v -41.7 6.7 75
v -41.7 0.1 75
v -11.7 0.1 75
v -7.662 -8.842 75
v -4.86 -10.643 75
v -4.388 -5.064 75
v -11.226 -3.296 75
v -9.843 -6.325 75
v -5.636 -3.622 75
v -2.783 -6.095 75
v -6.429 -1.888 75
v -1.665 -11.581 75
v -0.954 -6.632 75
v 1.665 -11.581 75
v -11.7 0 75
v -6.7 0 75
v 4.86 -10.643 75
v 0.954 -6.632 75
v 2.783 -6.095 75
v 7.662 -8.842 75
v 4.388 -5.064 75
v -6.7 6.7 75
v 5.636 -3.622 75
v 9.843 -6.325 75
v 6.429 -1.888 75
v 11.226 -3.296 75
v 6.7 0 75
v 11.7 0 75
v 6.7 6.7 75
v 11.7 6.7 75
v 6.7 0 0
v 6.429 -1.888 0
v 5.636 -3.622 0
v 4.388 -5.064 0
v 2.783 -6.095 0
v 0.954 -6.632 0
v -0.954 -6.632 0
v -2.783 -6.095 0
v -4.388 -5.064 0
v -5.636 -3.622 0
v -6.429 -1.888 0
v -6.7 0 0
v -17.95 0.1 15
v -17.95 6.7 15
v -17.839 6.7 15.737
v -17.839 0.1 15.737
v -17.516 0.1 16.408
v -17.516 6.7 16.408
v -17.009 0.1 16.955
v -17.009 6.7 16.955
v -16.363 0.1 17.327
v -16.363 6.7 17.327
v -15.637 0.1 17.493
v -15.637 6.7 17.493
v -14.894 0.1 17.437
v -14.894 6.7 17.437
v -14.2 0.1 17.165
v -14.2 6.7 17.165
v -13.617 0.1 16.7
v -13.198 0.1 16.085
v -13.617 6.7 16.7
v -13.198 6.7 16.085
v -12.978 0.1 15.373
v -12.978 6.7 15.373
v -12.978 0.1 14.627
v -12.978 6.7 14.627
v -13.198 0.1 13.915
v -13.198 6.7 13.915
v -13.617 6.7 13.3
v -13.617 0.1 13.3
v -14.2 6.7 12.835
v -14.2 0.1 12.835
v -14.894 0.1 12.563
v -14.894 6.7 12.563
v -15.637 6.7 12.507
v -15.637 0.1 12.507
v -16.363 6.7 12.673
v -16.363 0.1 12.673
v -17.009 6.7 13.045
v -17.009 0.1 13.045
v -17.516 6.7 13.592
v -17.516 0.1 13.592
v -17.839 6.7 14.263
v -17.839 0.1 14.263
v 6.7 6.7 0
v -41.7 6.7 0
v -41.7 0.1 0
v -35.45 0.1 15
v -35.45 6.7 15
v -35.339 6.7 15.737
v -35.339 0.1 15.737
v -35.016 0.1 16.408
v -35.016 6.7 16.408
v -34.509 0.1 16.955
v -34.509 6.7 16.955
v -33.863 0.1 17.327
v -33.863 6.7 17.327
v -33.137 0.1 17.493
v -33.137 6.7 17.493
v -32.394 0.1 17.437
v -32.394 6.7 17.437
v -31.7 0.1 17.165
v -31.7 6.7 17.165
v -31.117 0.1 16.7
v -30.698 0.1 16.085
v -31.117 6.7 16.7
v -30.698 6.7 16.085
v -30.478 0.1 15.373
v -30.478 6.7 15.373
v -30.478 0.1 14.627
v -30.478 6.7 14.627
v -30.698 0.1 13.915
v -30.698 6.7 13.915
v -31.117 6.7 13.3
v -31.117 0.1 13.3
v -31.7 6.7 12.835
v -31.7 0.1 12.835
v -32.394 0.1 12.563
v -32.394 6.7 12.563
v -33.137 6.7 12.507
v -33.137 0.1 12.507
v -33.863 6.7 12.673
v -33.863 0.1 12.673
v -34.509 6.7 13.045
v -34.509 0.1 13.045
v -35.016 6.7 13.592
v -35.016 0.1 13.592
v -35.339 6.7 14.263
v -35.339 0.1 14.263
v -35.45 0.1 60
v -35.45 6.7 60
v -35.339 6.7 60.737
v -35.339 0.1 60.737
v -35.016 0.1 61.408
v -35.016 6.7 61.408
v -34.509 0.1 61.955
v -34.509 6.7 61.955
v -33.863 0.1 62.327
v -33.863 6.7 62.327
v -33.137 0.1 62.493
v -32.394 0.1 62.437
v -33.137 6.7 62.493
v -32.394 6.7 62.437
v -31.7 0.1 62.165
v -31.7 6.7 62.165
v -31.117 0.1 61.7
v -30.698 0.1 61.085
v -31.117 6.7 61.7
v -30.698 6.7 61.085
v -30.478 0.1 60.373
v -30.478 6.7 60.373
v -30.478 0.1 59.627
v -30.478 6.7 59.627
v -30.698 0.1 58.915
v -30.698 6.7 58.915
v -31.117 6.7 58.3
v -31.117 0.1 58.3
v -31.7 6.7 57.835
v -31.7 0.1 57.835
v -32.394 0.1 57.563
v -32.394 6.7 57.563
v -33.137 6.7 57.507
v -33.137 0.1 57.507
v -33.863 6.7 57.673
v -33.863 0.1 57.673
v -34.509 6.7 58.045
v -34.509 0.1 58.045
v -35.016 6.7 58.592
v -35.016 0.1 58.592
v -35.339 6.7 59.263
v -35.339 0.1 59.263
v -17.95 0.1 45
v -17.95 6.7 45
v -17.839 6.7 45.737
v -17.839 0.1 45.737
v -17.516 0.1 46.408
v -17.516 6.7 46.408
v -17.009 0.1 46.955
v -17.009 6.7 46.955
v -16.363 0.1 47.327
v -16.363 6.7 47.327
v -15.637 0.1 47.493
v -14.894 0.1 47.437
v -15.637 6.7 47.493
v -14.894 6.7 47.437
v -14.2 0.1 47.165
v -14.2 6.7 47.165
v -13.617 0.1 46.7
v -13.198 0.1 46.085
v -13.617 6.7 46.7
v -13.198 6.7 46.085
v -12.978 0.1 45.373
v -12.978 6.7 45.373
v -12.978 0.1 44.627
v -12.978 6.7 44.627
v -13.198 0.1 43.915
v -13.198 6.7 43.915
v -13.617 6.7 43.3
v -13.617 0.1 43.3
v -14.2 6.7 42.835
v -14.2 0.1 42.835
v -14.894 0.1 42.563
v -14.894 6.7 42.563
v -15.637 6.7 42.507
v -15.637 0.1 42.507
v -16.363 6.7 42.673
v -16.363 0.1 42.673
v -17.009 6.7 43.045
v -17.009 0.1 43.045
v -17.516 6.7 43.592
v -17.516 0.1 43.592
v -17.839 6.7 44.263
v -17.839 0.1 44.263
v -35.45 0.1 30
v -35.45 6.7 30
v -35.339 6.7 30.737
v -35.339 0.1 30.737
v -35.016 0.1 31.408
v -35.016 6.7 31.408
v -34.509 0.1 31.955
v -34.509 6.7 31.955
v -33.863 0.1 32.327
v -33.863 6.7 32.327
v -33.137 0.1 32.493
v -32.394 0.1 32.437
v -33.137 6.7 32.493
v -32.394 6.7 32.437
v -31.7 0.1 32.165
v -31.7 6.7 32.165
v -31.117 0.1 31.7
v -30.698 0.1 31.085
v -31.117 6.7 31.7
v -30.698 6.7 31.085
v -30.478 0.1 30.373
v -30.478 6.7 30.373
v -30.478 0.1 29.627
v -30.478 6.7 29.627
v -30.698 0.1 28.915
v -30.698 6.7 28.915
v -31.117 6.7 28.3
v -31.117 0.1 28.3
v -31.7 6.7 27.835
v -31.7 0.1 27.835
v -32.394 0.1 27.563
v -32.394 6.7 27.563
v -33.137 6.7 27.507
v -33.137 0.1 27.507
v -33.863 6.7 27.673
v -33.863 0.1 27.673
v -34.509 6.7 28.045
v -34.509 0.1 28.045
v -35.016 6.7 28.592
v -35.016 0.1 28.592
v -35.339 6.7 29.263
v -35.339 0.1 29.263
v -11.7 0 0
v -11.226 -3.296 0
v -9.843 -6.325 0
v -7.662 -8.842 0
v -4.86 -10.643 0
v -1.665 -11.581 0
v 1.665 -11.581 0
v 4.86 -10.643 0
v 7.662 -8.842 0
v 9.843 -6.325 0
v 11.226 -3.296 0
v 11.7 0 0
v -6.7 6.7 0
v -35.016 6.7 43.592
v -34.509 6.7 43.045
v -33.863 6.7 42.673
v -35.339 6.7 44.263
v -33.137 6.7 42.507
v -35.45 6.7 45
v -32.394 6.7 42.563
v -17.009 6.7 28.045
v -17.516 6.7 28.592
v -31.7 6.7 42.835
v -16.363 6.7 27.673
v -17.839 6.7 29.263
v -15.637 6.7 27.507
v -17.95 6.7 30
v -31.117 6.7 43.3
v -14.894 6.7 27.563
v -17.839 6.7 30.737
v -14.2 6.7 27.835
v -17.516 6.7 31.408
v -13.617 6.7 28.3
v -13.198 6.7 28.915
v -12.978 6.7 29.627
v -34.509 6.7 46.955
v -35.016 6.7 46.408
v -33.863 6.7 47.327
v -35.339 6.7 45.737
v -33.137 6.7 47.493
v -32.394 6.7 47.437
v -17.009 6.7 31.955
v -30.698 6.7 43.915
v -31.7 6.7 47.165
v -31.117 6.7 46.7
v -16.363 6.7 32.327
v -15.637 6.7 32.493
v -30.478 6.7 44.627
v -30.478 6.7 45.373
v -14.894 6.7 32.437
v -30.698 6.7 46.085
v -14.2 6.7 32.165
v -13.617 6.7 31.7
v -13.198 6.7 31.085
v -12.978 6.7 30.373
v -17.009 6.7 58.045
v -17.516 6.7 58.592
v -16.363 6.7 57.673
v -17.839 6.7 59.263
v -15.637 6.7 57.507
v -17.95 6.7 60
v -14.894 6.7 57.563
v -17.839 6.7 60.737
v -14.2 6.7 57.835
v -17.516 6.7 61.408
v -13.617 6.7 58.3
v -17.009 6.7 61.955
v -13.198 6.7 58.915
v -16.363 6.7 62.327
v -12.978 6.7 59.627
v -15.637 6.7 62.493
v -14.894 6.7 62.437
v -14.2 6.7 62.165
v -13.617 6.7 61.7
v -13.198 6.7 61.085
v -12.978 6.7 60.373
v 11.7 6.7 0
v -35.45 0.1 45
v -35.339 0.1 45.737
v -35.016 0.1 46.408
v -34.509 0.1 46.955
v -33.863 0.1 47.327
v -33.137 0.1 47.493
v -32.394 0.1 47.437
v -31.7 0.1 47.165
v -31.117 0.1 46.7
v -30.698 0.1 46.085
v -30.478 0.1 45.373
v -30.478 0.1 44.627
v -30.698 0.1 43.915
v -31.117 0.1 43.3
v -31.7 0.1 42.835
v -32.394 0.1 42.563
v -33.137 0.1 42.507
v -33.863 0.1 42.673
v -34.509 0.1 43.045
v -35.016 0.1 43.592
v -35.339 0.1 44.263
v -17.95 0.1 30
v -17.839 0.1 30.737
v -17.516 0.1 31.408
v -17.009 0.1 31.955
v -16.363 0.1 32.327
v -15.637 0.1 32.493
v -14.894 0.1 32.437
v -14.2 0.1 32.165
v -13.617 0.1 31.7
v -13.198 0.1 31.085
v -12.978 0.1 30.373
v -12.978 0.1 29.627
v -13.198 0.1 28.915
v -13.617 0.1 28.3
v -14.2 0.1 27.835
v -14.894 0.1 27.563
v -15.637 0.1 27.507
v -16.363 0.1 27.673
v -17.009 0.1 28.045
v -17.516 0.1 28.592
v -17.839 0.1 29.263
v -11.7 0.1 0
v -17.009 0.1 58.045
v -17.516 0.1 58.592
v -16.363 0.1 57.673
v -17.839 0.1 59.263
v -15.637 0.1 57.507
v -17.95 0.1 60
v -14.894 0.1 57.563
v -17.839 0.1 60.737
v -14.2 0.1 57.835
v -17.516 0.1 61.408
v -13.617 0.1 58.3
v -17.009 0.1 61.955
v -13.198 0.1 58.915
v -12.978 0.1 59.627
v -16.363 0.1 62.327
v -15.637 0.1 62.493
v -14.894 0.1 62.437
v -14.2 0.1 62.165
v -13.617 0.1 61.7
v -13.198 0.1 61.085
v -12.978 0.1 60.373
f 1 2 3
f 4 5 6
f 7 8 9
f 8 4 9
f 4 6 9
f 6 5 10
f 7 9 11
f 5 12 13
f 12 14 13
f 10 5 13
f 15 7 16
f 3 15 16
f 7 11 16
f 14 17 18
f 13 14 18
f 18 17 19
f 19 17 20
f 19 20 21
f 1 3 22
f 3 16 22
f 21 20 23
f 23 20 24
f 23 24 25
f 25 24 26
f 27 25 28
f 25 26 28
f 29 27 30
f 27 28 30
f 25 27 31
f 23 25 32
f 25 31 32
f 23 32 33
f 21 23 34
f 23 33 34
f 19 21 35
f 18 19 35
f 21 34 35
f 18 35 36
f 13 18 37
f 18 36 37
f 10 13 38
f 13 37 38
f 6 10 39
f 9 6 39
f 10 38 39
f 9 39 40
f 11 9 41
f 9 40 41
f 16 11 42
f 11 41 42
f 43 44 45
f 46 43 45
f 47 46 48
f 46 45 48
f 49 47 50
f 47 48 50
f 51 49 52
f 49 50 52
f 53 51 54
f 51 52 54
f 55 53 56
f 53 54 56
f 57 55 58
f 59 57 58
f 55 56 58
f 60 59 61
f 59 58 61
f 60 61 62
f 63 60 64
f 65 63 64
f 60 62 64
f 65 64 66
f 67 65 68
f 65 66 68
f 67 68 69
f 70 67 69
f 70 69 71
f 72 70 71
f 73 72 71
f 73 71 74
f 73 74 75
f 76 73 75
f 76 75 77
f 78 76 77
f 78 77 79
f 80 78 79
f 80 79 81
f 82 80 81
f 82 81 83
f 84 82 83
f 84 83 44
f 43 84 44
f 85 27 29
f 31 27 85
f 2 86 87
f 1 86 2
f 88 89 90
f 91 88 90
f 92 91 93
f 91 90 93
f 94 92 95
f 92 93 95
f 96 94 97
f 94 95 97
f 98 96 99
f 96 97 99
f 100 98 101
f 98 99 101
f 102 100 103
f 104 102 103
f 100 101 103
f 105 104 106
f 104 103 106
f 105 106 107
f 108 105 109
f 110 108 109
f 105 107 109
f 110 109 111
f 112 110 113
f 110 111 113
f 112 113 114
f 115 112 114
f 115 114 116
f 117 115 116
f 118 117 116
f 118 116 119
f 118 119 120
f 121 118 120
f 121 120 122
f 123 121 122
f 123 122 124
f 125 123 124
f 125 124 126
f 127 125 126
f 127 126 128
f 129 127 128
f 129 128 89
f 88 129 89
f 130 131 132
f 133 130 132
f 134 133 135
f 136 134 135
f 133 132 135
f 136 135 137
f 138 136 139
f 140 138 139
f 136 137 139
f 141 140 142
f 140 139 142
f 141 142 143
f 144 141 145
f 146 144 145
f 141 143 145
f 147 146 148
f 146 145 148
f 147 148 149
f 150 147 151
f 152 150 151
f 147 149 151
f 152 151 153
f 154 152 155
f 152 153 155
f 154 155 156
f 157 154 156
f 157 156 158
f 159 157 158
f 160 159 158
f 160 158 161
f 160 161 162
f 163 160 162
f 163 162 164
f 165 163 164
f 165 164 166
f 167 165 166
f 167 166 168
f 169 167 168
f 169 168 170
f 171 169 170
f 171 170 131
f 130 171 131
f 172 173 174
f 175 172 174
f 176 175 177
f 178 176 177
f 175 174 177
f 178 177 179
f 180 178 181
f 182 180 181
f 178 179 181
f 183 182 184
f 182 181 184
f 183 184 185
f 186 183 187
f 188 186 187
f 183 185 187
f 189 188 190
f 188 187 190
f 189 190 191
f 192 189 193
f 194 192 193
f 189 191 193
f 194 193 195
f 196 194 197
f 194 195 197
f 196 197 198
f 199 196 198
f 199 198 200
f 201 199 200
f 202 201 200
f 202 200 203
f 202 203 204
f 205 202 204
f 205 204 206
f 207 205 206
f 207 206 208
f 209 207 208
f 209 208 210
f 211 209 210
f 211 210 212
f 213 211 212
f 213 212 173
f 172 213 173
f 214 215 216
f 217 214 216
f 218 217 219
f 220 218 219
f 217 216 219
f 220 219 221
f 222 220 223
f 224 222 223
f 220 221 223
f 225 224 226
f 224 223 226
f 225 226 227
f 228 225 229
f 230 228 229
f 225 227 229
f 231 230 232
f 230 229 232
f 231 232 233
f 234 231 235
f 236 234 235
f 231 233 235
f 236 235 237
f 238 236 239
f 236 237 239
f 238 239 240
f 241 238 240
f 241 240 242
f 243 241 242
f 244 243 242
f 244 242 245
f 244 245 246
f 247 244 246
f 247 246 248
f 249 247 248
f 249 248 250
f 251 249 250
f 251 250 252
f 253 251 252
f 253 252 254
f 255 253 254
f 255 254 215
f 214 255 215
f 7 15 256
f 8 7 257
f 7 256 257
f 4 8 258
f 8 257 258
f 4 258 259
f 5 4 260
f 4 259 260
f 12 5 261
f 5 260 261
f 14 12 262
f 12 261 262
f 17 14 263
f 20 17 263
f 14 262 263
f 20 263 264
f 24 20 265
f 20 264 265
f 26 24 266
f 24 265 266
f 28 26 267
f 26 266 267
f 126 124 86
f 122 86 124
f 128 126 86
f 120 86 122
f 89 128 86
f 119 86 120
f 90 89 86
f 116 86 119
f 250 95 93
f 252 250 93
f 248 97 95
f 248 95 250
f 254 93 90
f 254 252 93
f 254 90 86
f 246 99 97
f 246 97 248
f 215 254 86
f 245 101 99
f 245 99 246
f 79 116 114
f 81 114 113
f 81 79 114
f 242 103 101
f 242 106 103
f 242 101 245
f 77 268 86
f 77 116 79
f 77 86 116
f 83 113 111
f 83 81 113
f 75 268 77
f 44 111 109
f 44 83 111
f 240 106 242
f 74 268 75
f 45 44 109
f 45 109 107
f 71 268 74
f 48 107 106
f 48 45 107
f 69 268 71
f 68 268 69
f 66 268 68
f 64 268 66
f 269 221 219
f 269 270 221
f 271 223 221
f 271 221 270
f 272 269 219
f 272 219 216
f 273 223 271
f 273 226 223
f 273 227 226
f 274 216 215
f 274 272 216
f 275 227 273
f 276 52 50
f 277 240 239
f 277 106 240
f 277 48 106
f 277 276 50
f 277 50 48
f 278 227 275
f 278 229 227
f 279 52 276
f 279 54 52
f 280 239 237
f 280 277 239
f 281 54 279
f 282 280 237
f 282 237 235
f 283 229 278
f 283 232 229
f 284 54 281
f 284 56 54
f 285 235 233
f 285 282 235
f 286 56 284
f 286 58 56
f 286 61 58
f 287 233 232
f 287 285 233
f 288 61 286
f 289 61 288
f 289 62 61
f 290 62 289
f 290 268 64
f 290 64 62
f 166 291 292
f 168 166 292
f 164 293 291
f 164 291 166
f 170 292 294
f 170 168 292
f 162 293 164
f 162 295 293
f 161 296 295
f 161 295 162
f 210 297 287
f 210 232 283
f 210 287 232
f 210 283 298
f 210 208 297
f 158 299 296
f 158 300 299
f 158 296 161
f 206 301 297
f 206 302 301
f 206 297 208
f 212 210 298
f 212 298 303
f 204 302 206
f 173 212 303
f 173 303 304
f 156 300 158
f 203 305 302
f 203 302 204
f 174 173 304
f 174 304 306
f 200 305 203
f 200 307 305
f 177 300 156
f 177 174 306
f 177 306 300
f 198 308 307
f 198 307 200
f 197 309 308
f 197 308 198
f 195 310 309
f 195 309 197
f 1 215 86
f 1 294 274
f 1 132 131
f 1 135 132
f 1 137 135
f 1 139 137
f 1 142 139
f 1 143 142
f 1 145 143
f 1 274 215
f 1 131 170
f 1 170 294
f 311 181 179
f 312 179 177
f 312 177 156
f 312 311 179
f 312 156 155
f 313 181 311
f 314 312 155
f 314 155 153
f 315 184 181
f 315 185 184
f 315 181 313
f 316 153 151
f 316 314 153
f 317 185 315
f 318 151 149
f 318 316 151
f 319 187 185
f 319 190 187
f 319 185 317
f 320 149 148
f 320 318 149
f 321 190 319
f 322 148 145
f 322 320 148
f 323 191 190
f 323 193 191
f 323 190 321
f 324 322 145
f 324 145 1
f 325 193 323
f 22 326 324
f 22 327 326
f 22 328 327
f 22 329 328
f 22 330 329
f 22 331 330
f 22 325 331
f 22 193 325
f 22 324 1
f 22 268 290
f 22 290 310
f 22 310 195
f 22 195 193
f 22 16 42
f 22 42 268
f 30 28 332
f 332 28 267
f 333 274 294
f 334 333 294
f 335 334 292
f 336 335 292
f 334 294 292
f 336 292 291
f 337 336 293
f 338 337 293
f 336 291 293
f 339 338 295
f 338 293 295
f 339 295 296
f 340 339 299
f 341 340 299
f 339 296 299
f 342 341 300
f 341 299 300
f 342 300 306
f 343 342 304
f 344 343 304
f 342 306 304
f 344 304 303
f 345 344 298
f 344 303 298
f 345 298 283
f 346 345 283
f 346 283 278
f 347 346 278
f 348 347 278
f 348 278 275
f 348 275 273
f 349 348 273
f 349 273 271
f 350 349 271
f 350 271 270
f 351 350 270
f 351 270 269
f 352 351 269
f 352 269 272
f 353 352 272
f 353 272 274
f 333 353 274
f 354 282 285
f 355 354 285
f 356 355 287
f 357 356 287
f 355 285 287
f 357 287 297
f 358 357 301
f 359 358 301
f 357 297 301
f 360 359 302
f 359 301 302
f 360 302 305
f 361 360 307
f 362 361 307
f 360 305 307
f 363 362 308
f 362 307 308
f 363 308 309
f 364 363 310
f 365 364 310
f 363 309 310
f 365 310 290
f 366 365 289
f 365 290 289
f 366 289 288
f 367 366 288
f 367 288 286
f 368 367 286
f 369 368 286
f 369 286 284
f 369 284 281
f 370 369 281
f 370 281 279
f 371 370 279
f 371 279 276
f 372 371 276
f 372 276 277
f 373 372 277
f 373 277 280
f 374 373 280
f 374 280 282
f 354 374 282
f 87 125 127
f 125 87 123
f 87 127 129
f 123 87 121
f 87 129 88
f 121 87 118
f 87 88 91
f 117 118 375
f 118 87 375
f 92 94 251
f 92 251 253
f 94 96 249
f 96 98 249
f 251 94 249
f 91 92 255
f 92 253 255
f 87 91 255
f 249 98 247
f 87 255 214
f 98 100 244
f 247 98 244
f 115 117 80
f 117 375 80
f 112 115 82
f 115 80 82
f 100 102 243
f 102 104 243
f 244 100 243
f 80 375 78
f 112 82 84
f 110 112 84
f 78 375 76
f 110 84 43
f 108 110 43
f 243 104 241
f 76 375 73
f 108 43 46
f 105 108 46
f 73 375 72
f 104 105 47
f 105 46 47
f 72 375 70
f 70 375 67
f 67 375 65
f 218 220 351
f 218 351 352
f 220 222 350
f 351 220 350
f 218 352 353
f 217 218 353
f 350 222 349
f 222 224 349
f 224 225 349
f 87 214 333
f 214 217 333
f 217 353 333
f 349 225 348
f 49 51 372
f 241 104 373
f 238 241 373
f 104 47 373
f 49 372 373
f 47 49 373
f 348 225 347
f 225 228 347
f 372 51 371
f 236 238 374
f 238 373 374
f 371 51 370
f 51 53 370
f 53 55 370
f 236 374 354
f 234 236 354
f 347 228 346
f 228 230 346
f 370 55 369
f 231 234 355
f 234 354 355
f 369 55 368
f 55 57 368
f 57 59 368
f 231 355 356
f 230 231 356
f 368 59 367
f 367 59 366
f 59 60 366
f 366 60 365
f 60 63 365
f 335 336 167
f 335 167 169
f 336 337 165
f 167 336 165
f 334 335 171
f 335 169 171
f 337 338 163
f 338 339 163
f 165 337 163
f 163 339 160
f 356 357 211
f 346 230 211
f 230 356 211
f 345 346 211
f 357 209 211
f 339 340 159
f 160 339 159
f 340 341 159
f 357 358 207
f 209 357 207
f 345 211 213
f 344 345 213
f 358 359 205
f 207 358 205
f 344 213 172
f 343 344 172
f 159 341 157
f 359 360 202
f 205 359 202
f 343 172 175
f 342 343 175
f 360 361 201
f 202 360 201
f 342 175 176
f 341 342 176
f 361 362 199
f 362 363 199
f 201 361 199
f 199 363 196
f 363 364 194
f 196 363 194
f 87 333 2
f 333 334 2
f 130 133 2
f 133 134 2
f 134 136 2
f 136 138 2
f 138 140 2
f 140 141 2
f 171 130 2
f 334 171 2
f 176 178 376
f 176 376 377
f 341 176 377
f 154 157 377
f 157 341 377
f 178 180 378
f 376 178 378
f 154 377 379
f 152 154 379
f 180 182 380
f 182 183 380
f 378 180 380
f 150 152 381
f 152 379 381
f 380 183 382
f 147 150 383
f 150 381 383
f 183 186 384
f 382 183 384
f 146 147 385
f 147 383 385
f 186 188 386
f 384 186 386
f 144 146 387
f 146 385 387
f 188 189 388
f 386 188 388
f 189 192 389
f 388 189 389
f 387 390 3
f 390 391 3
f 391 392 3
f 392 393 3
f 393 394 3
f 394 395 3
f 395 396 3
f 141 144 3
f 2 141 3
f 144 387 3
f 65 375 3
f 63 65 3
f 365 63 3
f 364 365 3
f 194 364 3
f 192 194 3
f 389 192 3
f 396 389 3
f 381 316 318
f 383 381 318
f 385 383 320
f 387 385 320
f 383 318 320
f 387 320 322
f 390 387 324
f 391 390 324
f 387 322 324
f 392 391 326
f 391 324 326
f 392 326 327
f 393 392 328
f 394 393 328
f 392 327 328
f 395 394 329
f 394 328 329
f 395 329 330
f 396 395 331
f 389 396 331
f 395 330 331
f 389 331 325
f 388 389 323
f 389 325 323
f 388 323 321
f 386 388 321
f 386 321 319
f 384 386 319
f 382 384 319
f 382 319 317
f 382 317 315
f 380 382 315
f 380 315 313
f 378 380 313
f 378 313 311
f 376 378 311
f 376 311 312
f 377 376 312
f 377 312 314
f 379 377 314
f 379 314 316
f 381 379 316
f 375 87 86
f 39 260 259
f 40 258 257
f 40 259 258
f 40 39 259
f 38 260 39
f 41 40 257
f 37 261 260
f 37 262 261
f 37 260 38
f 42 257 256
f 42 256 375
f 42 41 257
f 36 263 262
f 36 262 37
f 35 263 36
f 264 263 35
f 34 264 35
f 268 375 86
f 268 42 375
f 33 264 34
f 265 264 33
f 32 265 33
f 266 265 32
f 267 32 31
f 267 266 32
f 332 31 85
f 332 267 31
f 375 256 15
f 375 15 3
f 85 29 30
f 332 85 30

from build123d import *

# Parameters (mm, degrees)
SKETCH3_W           = 5
SKETCH3_H           = 6.7
BOSS_EXTRUDE2_DEPTH = 75
SWEEP1_DEPTH        = 75
SKETCH8_W           = 5
SKETCH8_H           = 75
BOSS_EXTRUDE3_DEPTH = 6.7
SKETCH11_W          = 75
SKETCH11_H          = 6.6
BOSS_EXTRUDE4_DEPTH = 30
SKETCH12_R          = 2.5
CUT_EXTRUDE1_DEPTH  = 60


# Read off the part's stored shape, not the designer's step: Sweep1
with BuildPart() as part:
    # Sketch3 → Boss-Extrude2 (new body)
    with BuildSketch(Plane.XY):
        with Locations((-9.2, 3.35)):
            Rectangle(SKETCH3_W, SKETCH3_H)
    extrude(amount=BOSS_EXTRUDE2_DEPTH)

    # Sweep1 outline → Sweep1 (add)
    with BuildSketch(Plane.XY):
        with BuildLine():
            ThreePointArc((-11.7, 0), (0, -11.7), (11.7, 0))
            Line((11.7, 0), (6.7, 0))
            ThreePointArc((6.7, 0), (0, -6.7), (-6.7, 0))
            Line((-6.7, 0), (-11.7, 0))
        make_face()
    extrude(amount=SWEEP1_DEPTH)

    # Sketch8 → Boss-Extrude3 (add)
    with BuildSketch(Plane(origin=(0, 0, 0), x_dir=(1, 0, 0), z_dir=(0, 1, 0))):
        with Locations((9.2, -37.5)):
            Rectangle(SKETCH8_W, SKETCH8_H)
    extrude(amount=BOSS_EXTRUDE3_DEPTH)

    # Sketch11 → Boss-Extrude4 (add)
    with BuildSketch(Plane.ZY.offset(11.7)):
        with Locations((37.5, 3.4)):
            Rectangle(SKETCH11_W, SKETCH11_H)
    extrude(amount=BOSS_EXTRUDE4_DEPTH)

    # Sketch12 → Cut-Extrude1 (cut)
    with BuildSketch(Plane(origin=(0, 6.7, 0), x_dir=(1, 0, 0), z_dir=(0, 1, 0))):
        with Locations(Location((-15.45, -60, 0), (0, 0, 180))):
            Circle(SKETCH12_R)
        with Locations(Location((-15.45, -45, 0), (0, 0, 180))):
            Circle(SKETCH12_R)
        with Locations(Location((-32.95, -45, 0), (0, 0, 180))):
            Circle(SKETCH12_R)
        with Locations(Location((-32.95, -60, 0), (0, 0, 180))):
            Circle(SKETCH12_R)
        with Locations(Location((-15.45, -30, 0), (0, 0, 180))):
            Circle(SKETCH12_R)
        with Locations(Location((-32.95, -30, 0), (0, 0, 180))):
            Circle(SKETCH12_R)
        with Locations(Location((-15.45, -15, 0), (0, 0, 180))):
            Circle(SKETCH12_R)
        with Locations(Location((-32.95, -15, 0), (0, 0, 180))):
            Circle(SKETCH12_R)
    extrude(amount=-CUT_EXTRUDE1_DEPTH, mode=Mode.SUBTRACT)


solid = part.part
